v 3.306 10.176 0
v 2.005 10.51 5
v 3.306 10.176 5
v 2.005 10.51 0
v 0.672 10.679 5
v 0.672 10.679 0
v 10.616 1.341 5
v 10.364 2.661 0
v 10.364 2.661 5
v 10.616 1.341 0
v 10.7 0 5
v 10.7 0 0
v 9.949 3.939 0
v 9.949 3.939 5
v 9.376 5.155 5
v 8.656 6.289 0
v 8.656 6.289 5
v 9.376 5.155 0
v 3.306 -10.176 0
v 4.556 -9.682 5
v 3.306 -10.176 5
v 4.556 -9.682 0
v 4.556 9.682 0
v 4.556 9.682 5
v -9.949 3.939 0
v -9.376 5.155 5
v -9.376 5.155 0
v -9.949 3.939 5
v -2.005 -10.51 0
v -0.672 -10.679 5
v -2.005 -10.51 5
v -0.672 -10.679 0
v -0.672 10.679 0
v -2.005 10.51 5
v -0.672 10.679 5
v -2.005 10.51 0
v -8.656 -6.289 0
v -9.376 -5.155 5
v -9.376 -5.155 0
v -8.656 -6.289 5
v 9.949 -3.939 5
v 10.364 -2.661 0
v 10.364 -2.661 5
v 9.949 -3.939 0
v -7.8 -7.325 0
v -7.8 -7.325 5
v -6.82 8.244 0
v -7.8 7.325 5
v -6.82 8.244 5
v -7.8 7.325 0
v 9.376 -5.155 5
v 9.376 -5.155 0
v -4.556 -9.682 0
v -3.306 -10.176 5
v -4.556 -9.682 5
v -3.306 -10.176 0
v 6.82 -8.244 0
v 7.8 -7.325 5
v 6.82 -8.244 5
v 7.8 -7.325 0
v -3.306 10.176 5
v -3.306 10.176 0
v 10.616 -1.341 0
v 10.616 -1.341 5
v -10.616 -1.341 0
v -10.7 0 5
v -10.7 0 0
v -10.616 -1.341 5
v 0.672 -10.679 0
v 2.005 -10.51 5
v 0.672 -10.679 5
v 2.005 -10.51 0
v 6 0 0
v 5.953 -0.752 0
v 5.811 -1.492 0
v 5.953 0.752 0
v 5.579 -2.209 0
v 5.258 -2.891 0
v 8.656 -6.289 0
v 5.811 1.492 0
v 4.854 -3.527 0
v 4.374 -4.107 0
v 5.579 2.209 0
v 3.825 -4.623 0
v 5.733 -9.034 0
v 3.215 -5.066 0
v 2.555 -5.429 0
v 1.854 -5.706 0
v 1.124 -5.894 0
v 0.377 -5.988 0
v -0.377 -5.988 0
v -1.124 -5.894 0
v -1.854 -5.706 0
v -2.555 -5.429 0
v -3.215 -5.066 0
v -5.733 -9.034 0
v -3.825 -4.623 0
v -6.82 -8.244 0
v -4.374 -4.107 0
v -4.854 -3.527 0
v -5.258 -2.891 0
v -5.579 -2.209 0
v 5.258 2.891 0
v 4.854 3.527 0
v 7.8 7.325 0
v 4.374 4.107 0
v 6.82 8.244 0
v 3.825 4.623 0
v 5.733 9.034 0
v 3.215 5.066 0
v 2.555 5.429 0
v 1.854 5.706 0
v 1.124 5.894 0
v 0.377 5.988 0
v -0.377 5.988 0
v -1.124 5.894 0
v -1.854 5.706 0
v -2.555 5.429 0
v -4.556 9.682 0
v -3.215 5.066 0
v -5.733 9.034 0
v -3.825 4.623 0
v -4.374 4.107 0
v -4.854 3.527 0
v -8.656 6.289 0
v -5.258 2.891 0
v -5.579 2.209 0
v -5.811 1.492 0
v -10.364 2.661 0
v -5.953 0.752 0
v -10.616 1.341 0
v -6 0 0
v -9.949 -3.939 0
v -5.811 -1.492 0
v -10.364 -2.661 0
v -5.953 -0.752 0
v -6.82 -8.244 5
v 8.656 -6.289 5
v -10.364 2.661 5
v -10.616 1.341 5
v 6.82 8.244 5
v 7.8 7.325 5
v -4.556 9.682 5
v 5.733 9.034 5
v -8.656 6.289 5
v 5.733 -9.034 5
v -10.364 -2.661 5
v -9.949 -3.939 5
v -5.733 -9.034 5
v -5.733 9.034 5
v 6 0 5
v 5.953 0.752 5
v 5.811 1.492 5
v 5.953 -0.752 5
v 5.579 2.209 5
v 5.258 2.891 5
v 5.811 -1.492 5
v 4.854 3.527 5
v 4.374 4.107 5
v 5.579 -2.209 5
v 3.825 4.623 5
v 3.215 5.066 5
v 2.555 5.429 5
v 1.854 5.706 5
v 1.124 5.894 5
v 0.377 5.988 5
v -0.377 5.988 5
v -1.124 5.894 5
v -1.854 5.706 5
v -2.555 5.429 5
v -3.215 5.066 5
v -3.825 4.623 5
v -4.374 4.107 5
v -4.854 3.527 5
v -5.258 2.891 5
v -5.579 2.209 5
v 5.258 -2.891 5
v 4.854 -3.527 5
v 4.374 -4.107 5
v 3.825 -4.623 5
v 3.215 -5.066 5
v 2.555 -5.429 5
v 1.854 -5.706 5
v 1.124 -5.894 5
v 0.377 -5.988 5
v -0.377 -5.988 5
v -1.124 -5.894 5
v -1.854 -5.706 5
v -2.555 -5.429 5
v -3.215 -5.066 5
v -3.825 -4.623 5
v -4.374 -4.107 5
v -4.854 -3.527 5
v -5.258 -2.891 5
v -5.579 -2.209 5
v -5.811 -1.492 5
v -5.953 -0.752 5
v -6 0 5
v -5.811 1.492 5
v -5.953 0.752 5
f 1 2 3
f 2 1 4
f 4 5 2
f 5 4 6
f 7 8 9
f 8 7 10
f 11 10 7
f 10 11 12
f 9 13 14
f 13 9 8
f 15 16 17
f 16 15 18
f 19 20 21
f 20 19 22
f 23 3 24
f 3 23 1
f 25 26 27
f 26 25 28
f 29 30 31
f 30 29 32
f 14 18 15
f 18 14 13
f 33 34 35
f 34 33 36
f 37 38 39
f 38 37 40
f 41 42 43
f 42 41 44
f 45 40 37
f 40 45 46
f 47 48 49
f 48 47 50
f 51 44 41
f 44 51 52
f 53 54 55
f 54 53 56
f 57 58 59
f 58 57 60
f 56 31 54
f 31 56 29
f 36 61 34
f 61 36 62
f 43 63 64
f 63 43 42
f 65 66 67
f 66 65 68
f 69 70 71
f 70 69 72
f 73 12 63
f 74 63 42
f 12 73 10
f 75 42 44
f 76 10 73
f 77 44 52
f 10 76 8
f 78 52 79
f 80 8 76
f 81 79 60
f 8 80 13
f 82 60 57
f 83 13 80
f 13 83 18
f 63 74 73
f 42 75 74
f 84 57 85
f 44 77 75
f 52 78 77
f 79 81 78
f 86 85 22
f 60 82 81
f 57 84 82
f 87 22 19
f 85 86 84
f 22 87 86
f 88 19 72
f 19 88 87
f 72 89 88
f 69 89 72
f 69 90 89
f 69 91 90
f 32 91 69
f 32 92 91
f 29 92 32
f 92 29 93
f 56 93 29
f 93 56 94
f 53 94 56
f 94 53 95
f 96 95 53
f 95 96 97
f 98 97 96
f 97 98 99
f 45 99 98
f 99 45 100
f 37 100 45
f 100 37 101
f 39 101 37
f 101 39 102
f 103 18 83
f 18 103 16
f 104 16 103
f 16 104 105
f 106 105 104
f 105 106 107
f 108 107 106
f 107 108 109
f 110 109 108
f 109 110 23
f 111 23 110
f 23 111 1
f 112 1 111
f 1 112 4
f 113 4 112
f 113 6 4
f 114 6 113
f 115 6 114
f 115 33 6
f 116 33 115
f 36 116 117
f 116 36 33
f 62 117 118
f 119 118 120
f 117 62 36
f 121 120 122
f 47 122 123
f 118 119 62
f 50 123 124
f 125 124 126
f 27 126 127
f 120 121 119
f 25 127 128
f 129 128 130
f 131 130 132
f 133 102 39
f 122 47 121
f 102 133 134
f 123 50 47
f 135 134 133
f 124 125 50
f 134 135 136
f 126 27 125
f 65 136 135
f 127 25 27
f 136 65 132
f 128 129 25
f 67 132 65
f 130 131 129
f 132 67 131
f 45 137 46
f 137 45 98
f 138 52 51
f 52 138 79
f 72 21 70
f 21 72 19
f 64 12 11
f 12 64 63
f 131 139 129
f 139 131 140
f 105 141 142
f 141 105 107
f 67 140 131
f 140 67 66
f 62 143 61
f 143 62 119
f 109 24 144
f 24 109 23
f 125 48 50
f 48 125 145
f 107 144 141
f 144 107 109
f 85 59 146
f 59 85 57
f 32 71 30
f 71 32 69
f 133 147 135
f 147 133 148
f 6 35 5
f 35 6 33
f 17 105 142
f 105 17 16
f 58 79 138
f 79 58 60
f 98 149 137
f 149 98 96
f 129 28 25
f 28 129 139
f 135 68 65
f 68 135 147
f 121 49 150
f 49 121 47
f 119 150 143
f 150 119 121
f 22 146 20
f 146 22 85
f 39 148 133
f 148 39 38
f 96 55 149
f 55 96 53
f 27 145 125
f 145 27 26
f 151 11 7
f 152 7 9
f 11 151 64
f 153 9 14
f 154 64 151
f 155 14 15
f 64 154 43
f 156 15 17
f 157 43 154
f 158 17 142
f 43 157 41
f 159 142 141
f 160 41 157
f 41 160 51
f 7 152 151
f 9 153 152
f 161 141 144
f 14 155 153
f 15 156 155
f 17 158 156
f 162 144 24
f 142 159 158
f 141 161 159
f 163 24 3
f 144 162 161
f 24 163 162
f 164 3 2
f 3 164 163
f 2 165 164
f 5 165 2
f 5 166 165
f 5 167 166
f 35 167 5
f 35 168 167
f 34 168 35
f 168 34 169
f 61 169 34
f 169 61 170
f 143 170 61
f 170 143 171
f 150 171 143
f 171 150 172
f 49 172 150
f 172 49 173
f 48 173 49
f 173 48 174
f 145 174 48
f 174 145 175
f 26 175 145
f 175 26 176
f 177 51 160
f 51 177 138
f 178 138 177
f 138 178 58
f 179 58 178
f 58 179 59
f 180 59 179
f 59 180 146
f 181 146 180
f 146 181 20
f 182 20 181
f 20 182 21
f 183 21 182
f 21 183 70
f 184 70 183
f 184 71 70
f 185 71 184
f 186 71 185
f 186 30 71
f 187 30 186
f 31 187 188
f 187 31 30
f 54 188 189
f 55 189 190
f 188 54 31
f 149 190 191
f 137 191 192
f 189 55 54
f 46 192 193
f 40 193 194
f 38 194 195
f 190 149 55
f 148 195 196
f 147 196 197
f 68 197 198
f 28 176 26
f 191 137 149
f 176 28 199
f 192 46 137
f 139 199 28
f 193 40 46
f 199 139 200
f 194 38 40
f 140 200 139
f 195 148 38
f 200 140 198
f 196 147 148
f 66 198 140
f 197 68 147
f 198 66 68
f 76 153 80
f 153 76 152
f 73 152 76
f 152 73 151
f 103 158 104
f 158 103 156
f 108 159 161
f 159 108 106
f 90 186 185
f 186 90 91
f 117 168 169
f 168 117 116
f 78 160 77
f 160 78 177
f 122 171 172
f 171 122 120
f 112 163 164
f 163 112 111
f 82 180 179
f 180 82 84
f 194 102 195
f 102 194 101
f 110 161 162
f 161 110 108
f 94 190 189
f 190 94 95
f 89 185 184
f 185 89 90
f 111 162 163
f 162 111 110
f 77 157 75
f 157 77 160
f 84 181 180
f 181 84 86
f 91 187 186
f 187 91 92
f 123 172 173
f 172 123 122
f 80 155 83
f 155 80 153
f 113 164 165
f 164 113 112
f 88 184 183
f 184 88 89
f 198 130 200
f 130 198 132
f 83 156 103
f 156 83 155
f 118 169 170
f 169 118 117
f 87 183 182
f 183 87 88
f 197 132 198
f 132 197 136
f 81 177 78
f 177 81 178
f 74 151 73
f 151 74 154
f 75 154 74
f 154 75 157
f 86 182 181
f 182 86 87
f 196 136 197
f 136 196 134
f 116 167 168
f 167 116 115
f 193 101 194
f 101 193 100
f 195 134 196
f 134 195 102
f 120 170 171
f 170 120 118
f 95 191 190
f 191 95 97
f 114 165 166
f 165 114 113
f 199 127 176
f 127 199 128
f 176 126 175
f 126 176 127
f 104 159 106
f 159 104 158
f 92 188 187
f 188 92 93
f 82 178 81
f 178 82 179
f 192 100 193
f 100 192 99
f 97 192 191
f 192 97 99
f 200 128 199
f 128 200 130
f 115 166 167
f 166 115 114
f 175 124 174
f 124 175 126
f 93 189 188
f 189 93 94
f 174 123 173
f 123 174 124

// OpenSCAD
$fn = 50;


difference() {
	union() {
		cylinder(h = 5, r = 10.7000000000);
	}
	union() {
		cylinder(h = 5, r = 6.0000000000);
	}
}
